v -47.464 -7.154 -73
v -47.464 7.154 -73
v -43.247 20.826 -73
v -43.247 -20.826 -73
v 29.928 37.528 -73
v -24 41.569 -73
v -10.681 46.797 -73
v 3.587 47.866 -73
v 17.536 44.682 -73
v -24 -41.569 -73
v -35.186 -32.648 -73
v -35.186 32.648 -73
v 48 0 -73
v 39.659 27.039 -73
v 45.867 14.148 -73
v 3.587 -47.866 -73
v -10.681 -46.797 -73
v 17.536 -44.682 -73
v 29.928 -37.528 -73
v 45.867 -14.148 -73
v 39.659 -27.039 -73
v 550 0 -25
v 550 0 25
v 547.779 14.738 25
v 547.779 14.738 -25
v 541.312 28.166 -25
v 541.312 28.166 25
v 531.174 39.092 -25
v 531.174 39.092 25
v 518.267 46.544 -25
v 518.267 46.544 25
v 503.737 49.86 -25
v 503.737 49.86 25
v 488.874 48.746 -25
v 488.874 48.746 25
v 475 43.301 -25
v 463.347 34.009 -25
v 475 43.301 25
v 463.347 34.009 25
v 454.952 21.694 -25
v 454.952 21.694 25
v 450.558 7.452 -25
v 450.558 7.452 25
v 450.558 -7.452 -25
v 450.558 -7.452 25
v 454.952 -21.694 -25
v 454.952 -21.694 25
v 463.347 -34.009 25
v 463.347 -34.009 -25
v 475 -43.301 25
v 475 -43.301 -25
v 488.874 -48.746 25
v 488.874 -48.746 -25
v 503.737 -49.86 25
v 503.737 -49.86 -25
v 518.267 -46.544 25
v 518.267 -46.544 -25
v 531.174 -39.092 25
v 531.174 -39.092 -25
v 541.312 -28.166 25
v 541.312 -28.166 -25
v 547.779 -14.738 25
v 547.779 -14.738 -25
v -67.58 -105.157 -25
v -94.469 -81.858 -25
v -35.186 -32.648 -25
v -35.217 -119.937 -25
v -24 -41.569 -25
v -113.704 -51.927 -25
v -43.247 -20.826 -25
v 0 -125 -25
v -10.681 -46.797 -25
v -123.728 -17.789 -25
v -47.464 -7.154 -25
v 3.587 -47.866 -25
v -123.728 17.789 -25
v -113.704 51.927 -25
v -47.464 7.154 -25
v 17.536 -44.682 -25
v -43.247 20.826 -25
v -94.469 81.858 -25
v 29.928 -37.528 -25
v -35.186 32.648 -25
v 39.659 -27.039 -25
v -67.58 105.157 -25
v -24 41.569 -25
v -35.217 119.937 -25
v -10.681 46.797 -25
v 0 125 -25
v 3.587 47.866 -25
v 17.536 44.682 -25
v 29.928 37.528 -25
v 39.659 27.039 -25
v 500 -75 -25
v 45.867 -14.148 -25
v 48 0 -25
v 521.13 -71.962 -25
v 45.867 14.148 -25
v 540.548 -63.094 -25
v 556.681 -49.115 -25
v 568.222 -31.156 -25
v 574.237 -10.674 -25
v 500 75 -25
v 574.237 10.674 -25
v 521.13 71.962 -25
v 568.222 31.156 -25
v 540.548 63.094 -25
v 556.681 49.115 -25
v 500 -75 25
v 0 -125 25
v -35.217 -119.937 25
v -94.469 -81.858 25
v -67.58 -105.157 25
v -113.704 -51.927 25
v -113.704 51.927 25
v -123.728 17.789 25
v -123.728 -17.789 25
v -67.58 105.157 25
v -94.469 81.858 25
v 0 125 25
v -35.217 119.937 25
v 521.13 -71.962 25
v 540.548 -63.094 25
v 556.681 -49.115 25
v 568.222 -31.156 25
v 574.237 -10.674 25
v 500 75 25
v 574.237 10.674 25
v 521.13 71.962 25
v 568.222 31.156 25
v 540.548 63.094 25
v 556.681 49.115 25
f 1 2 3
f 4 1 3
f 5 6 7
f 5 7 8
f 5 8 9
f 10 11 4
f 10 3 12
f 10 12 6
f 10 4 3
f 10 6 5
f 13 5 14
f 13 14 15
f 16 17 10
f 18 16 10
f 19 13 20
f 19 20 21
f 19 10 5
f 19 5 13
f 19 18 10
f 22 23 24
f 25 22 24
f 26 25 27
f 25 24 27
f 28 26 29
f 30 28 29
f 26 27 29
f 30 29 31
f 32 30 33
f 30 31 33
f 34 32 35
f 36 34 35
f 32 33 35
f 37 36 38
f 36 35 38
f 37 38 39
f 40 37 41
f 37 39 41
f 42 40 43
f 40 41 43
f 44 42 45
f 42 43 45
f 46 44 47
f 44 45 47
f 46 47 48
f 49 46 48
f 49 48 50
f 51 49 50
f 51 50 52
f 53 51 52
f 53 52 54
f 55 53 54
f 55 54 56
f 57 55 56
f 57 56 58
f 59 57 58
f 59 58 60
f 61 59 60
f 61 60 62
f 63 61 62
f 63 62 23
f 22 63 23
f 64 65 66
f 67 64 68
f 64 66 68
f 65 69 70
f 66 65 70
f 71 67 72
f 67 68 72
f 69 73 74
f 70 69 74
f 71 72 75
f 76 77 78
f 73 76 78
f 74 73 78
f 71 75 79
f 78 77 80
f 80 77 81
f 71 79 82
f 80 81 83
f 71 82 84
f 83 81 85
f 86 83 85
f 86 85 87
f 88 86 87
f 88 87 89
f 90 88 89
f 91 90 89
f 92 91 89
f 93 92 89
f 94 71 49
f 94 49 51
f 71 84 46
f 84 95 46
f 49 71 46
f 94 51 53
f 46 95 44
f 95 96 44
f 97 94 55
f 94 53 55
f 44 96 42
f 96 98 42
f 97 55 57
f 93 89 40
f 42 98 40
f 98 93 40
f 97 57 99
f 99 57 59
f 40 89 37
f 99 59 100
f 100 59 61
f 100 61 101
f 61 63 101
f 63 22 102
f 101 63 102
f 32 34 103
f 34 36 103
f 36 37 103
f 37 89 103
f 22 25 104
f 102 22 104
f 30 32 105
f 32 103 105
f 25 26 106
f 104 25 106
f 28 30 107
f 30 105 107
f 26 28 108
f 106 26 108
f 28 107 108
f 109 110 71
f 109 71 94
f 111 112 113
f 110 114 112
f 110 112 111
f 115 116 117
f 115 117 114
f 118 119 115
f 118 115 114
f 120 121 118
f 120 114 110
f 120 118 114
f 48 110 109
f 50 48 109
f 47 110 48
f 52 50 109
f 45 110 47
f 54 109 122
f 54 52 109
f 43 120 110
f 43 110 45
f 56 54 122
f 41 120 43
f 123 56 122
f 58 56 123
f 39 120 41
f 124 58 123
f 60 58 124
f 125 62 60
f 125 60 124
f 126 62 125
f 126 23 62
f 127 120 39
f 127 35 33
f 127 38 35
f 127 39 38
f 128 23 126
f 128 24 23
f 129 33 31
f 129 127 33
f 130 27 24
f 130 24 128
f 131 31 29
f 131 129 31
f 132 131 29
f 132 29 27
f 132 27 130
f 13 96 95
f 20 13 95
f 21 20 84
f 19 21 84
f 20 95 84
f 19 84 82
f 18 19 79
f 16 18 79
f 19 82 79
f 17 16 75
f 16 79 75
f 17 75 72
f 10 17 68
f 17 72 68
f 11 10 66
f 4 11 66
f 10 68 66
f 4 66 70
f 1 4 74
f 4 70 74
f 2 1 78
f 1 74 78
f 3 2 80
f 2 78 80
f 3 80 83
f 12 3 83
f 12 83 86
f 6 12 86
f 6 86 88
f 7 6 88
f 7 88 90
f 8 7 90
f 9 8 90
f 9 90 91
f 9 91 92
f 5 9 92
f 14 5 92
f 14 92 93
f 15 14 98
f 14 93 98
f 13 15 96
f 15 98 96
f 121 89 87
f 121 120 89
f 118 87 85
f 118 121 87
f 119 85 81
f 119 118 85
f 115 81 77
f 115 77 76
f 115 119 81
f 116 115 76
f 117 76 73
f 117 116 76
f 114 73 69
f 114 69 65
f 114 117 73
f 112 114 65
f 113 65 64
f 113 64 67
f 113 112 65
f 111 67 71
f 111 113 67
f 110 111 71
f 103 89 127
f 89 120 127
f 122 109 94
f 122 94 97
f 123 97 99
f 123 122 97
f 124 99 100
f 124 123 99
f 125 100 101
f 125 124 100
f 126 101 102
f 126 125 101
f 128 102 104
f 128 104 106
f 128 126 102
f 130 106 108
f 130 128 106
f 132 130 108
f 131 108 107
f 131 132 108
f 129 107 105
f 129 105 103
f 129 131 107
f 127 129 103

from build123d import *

# Parameters (mm, degrees)
PAD_DEPTH    = 25
SKETCH001_R  = 48
PAD001_DEPTH = 48
SKETCH002_R  = 50
POCKET_DEPTH = 51


with BuildPart() as part:
    # Sketch → Pad (new body, symmetric)
    with BuildSketch(Plane.XY):
        with BuildLine():
            ThreePointArc((0, 125), (-125, 0), (0, -125))
            Line((0, -125), (500, -75))
            ThreePointArc((500, -75), (575, 0), (500, 75))
            Line((0, 125), (500, 75))
        make_face()
    extrude(amount=PAD_DEPTH, both=True)

    # Sketch001 (on Face5 of Pad) → Pad001 (join)
    with BuildSketch(Plane(origin=(0, 0, -25), x_dir=(1, 0, 0), z_dir=(0, 0, -1))):
        Circle(SKETCH001_R)
    extrude(amount=PAD001_DEPTH)

    # Sketch002 (on Face5 of Pad001) → Pocket (cut)
    with BuildSketch(Plane.XY.offset(25)):
        with Locations((500, 0)):
            Circle(SKETCH002_R)
    extrude(amount=-POCKET_DEPTH, mode=Mode.SUBTRACT)


solid = part.part
